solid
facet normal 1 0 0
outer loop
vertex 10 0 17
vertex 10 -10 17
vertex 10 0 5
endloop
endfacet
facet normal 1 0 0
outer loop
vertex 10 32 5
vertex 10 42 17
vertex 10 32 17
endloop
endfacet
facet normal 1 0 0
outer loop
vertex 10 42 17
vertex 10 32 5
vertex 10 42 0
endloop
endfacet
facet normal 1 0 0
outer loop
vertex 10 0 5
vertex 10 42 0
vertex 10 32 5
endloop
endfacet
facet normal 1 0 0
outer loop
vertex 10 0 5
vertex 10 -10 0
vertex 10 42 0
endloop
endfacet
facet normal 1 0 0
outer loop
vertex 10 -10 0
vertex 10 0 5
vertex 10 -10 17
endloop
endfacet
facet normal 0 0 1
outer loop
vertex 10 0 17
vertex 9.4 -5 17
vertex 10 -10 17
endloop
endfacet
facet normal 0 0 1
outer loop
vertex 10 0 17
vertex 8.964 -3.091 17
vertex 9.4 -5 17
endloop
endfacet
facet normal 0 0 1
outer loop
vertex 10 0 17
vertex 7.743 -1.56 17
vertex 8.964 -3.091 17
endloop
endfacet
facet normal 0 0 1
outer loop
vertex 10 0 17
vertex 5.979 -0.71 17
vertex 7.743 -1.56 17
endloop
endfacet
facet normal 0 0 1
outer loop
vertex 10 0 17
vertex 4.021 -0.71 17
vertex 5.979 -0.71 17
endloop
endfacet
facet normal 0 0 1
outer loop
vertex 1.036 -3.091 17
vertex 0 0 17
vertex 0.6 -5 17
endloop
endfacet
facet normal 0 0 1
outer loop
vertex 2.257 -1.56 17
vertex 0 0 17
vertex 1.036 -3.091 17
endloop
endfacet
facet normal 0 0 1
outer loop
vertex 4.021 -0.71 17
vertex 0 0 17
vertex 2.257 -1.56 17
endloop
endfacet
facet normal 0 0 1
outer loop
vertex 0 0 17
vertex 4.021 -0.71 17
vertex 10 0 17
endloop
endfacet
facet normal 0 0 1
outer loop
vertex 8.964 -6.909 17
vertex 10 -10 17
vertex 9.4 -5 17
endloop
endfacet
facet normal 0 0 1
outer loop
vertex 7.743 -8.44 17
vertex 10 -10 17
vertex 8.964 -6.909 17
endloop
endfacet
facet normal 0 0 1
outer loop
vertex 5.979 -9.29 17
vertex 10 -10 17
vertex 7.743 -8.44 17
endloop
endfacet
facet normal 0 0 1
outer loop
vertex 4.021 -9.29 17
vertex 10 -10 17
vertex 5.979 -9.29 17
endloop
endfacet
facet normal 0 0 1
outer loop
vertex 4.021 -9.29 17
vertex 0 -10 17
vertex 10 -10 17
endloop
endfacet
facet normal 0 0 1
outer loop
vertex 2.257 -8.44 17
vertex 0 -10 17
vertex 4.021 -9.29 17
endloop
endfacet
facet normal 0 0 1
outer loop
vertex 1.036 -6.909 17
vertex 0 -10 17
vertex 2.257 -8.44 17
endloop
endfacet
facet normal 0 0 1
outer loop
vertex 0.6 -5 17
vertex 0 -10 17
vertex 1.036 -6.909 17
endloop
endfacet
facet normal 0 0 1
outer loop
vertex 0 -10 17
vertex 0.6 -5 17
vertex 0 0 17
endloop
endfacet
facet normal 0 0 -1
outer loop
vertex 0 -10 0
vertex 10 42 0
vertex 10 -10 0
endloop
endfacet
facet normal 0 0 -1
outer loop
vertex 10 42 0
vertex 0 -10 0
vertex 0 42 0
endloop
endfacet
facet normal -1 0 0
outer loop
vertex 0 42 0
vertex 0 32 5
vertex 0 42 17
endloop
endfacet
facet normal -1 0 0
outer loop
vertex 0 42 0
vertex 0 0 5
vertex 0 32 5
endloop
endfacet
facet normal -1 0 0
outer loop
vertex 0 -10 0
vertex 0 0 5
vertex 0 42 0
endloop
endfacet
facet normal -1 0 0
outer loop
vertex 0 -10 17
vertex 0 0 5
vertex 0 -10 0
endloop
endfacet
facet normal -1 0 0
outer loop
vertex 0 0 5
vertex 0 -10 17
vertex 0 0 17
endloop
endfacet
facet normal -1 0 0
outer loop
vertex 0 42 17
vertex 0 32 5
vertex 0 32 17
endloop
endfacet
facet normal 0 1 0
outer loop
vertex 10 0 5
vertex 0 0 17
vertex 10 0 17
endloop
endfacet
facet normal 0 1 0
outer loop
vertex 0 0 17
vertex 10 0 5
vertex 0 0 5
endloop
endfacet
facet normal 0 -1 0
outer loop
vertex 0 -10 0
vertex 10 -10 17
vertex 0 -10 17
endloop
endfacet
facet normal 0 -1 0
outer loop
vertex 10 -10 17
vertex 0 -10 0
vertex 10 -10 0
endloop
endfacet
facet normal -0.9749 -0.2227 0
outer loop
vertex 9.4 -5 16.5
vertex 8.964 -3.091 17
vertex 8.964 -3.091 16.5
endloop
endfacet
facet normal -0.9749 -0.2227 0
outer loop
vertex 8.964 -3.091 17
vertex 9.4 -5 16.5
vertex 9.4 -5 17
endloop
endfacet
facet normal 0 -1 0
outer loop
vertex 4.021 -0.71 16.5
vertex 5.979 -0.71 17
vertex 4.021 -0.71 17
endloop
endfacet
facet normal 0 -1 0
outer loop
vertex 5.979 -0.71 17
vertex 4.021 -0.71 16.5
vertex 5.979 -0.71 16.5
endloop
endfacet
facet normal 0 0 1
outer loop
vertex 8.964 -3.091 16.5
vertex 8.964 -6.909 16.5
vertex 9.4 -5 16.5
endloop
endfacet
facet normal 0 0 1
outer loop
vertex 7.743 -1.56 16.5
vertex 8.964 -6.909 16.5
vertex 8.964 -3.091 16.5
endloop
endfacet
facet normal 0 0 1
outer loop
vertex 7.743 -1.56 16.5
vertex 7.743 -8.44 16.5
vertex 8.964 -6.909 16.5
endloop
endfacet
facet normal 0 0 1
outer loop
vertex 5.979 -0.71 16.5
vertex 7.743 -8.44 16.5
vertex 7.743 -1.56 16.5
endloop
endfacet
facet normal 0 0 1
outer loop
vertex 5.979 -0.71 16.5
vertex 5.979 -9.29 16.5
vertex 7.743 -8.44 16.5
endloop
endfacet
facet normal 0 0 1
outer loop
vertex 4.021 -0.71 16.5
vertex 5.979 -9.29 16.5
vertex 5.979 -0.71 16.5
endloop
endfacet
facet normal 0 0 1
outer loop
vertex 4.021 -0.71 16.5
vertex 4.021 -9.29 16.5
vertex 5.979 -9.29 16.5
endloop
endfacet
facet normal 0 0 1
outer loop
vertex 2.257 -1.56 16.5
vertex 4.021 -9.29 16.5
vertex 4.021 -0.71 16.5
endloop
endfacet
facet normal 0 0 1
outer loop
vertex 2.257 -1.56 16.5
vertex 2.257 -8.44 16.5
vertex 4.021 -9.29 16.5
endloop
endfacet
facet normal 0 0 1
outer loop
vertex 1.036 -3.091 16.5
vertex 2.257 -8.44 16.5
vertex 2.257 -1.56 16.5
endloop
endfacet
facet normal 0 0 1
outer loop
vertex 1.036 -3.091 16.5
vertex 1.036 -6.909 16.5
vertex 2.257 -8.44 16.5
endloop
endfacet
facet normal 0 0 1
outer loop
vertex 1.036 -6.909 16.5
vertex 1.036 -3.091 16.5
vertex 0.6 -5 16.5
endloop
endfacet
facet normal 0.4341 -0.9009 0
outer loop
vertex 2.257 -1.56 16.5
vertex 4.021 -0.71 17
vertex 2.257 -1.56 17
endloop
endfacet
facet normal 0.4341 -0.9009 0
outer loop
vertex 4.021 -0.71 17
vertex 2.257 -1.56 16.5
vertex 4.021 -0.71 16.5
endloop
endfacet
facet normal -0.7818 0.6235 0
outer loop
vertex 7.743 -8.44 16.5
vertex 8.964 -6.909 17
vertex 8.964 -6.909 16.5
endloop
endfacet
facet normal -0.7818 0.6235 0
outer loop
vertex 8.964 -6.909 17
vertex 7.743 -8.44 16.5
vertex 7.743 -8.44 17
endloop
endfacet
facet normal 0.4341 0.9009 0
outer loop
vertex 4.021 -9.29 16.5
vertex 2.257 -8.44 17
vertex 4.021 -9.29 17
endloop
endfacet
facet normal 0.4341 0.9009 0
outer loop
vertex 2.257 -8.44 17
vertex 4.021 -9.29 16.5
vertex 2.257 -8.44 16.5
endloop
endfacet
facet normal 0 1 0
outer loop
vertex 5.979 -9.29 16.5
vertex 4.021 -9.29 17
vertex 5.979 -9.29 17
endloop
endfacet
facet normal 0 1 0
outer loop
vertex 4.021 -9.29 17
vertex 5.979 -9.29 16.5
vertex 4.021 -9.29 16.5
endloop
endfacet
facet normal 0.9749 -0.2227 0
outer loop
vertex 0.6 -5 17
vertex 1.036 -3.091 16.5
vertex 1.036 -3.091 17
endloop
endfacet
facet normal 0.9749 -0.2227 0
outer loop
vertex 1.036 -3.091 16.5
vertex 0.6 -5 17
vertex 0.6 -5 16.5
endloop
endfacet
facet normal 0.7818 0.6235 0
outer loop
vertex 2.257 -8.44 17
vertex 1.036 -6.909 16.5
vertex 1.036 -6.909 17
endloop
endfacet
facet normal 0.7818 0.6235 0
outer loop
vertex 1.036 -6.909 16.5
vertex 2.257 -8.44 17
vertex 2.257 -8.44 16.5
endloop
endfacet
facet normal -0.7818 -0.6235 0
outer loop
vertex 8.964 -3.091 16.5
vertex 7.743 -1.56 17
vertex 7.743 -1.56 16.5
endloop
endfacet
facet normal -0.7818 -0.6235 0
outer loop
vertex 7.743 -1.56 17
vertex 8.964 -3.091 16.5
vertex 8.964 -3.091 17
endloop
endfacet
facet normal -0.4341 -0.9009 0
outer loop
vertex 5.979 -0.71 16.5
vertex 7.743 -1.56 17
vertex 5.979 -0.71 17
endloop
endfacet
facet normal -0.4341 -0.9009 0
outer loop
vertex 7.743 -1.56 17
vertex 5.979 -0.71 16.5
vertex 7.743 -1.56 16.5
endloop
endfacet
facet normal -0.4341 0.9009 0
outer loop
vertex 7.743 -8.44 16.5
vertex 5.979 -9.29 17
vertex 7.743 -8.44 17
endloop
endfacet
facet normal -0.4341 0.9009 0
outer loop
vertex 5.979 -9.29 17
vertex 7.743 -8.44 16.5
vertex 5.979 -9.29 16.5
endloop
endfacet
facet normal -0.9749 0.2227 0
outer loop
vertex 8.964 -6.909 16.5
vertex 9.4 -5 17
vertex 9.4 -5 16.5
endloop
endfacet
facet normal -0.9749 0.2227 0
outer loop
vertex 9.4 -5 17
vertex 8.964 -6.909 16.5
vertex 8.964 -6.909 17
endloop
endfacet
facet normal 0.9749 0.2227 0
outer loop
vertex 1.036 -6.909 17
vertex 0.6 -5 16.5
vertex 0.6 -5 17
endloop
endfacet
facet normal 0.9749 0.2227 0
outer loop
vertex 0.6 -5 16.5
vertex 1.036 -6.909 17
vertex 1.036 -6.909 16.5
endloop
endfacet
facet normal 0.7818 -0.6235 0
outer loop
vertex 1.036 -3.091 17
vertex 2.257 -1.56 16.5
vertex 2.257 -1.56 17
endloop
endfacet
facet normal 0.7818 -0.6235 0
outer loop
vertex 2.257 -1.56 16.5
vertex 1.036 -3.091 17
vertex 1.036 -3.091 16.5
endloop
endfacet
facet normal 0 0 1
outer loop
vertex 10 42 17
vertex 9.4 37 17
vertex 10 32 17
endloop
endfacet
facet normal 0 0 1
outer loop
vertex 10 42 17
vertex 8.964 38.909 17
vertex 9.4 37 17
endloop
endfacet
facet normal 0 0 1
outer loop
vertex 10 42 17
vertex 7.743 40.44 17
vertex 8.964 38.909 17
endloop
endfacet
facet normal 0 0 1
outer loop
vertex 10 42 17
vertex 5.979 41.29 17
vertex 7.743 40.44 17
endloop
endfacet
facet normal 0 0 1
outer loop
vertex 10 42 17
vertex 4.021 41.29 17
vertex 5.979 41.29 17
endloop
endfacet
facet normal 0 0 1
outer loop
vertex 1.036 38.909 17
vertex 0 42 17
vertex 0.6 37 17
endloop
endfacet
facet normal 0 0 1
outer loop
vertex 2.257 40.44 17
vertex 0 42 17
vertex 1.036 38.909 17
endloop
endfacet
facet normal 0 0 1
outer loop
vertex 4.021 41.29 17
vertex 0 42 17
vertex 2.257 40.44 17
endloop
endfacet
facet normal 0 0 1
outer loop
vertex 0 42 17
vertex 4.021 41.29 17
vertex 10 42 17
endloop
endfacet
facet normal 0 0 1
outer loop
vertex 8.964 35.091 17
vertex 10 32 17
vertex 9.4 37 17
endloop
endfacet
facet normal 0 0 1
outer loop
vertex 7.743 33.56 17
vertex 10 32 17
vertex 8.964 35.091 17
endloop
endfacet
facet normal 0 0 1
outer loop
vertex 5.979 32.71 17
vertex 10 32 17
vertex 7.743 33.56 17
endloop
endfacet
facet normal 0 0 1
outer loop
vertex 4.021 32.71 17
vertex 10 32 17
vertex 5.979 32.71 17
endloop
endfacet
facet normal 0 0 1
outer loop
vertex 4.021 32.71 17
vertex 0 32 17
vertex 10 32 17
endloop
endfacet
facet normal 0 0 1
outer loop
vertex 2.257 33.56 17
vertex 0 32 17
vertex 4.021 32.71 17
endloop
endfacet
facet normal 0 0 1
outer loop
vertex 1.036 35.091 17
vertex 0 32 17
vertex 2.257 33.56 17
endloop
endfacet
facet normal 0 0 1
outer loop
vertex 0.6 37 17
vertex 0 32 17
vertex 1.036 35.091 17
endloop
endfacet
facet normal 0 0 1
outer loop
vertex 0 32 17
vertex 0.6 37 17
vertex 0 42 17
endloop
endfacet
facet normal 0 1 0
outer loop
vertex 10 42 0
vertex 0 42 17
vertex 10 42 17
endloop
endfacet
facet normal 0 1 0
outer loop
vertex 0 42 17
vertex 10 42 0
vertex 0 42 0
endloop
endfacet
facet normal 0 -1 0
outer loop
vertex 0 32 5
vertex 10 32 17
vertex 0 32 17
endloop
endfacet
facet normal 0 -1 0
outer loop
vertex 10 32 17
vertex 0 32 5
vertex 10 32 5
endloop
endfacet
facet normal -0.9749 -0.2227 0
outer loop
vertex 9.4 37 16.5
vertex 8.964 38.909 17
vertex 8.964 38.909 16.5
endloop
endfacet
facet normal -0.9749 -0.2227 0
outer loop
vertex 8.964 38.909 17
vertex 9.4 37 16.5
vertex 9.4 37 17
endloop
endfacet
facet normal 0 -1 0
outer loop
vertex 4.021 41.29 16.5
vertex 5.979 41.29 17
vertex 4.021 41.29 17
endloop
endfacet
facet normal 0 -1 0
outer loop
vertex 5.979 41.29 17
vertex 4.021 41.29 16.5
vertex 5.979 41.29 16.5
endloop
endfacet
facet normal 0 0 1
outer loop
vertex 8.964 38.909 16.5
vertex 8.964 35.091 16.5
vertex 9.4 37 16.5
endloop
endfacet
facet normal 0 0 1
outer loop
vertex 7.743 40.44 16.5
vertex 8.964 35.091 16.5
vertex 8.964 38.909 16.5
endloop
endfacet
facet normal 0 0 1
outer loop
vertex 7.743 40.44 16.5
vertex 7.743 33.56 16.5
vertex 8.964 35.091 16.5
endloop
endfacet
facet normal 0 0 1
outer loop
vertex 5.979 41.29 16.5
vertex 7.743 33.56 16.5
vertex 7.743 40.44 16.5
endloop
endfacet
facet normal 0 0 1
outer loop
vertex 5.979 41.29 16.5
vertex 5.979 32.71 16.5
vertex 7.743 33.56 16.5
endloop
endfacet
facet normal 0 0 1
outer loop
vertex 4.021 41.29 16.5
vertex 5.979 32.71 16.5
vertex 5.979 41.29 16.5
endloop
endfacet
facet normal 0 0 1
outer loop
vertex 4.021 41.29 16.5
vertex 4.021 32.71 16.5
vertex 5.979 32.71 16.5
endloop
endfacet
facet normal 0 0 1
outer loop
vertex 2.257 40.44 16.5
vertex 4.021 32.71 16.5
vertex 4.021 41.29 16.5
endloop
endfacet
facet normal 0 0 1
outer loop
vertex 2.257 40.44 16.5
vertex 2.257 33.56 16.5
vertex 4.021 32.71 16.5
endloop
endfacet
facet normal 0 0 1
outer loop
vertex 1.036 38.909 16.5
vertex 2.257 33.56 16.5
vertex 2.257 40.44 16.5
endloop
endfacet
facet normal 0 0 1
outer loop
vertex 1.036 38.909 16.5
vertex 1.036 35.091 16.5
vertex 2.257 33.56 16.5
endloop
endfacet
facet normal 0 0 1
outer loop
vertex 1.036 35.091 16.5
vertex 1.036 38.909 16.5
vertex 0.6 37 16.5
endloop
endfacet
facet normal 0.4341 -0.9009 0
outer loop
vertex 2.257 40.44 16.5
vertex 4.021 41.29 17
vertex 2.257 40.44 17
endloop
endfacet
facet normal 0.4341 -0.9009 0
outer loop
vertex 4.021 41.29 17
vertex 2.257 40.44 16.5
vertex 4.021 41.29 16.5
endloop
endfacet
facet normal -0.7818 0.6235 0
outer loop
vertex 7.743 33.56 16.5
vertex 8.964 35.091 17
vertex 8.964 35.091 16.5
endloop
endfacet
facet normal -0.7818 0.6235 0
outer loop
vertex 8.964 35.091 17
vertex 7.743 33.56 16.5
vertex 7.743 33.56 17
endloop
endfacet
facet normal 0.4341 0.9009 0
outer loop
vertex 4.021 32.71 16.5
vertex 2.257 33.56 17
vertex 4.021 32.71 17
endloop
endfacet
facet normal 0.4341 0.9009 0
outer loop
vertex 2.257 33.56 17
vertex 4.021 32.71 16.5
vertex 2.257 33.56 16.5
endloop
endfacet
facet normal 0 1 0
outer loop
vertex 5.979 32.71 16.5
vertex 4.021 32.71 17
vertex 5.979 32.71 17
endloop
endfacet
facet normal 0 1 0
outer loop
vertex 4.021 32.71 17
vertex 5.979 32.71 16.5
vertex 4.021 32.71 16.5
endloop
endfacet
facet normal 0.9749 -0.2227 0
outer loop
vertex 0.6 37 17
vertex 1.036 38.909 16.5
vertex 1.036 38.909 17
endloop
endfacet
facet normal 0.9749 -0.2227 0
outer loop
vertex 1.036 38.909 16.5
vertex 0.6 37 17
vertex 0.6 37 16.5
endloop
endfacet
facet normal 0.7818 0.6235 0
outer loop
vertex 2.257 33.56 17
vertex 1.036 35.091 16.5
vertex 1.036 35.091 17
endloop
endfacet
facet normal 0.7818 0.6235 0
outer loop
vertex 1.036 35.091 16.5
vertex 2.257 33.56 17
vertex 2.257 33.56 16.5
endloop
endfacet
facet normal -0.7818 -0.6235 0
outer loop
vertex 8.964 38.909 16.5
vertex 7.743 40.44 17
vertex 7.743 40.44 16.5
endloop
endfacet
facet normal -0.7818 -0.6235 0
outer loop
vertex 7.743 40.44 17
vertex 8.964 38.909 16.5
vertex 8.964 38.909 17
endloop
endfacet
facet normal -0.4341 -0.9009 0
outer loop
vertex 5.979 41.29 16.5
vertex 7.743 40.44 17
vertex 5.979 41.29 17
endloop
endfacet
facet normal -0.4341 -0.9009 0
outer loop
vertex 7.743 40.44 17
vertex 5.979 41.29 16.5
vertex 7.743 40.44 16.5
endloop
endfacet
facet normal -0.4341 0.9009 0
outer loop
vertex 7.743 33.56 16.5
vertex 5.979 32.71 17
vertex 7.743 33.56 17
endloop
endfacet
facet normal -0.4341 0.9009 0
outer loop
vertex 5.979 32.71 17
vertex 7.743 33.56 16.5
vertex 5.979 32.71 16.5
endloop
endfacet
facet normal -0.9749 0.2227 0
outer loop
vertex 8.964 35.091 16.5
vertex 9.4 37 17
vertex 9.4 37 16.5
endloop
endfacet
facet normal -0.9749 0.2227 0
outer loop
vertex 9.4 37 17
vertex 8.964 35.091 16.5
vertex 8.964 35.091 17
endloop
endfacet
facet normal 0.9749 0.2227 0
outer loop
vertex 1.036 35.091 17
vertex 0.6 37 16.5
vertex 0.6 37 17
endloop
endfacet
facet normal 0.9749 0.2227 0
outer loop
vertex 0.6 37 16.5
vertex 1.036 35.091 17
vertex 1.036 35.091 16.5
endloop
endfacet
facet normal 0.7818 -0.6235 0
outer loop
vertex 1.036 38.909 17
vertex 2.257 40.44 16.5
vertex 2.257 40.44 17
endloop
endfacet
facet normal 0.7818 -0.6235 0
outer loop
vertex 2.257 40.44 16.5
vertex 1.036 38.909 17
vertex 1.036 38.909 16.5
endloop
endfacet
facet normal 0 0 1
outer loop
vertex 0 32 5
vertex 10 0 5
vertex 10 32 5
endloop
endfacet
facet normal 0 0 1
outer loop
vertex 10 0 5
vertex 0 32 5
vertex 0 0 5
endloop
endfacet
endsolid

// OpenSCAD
stroke = 10;

bridge = 12;

height = 32;

module foot() {
    difference() {
        cube([stroke, stroke, bridge + (stroke / 2)], center=false);
        translate([stroke/2, stroke/2, bridge + stroke / 2 -0.5]) cylinder(h=2, r=4.4);
    }
}

cube([stroke, height, stroke / 2]);
translate([0, -stroke, 0]) foot();
translate([0, height, 0]) foot();
